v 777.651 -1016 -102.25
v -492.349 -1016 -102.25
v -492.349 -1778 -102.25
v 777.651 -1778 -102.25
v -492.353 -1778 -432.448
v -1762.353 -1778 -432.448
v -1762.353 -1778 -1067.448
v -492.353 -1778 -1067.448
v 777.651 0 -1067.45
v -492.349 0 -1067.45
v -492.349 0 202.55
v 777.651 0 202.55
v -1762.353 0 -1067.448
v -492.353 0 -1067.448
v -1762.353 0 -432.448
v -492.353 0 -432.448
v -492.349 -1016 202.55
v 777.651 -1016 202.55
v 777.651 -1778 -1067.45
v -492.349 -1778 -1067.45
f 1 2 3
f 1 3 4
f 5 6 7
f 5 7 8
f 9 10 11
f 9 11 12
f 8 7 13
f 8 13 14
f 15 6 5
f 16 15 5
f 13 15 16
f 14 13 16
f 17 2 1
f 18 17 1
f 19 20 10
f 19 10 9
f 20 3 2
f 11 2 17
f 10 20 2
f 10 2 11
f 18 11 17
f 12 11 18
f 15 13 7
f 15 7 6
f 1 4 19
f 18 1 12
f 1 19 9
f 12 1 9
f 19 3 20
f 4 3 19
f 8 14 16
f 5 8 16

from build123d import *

# Parameters (mm, degrees)
F1_W     = 1270
F1_H     = 965.2
F2_DEPTH = 1778
F0_W     = 1270
F0_H     = 635
F3_DEPTH = 1778
F6_W     = 1270
F6_H     = 1016
F7_DEPTH = 304.8


# Not quite as in the source:
# - a feature of the source that left no trace in its solid (it failed there, or was rolled back) is left out


with BuildPart() as f2:
    # F1 (on Front) → F2 (new body)
    with BuildSketch(Plane.XZ):
        with Locations((142.6505839825, -584.8500465393)):
            Rectangle(F1_W, F1_H)
    extrude(amount=F2_DEPTH)

    # F6 (on face) → F7 (join)
    with BuildSketch(Plane.XY.offset(-102.2500465393)):
        with Locations((142.6505839825, -508)):
            Rectangle(F6_W, F6_H)
    extrude(amount=F7_DEPTH)


with BuildPart() as f3:
    # F0 (on Front) → F3 (new body)
    with BuildSketch(Plane.XZ):
        with Locations((-1127.3534202576, -749.9475431442)):
            Rectangle(F0_W, F0_H)
    extrude(amount=F3_DEPTH)


solid = Compound([f2.part, f3.part])
